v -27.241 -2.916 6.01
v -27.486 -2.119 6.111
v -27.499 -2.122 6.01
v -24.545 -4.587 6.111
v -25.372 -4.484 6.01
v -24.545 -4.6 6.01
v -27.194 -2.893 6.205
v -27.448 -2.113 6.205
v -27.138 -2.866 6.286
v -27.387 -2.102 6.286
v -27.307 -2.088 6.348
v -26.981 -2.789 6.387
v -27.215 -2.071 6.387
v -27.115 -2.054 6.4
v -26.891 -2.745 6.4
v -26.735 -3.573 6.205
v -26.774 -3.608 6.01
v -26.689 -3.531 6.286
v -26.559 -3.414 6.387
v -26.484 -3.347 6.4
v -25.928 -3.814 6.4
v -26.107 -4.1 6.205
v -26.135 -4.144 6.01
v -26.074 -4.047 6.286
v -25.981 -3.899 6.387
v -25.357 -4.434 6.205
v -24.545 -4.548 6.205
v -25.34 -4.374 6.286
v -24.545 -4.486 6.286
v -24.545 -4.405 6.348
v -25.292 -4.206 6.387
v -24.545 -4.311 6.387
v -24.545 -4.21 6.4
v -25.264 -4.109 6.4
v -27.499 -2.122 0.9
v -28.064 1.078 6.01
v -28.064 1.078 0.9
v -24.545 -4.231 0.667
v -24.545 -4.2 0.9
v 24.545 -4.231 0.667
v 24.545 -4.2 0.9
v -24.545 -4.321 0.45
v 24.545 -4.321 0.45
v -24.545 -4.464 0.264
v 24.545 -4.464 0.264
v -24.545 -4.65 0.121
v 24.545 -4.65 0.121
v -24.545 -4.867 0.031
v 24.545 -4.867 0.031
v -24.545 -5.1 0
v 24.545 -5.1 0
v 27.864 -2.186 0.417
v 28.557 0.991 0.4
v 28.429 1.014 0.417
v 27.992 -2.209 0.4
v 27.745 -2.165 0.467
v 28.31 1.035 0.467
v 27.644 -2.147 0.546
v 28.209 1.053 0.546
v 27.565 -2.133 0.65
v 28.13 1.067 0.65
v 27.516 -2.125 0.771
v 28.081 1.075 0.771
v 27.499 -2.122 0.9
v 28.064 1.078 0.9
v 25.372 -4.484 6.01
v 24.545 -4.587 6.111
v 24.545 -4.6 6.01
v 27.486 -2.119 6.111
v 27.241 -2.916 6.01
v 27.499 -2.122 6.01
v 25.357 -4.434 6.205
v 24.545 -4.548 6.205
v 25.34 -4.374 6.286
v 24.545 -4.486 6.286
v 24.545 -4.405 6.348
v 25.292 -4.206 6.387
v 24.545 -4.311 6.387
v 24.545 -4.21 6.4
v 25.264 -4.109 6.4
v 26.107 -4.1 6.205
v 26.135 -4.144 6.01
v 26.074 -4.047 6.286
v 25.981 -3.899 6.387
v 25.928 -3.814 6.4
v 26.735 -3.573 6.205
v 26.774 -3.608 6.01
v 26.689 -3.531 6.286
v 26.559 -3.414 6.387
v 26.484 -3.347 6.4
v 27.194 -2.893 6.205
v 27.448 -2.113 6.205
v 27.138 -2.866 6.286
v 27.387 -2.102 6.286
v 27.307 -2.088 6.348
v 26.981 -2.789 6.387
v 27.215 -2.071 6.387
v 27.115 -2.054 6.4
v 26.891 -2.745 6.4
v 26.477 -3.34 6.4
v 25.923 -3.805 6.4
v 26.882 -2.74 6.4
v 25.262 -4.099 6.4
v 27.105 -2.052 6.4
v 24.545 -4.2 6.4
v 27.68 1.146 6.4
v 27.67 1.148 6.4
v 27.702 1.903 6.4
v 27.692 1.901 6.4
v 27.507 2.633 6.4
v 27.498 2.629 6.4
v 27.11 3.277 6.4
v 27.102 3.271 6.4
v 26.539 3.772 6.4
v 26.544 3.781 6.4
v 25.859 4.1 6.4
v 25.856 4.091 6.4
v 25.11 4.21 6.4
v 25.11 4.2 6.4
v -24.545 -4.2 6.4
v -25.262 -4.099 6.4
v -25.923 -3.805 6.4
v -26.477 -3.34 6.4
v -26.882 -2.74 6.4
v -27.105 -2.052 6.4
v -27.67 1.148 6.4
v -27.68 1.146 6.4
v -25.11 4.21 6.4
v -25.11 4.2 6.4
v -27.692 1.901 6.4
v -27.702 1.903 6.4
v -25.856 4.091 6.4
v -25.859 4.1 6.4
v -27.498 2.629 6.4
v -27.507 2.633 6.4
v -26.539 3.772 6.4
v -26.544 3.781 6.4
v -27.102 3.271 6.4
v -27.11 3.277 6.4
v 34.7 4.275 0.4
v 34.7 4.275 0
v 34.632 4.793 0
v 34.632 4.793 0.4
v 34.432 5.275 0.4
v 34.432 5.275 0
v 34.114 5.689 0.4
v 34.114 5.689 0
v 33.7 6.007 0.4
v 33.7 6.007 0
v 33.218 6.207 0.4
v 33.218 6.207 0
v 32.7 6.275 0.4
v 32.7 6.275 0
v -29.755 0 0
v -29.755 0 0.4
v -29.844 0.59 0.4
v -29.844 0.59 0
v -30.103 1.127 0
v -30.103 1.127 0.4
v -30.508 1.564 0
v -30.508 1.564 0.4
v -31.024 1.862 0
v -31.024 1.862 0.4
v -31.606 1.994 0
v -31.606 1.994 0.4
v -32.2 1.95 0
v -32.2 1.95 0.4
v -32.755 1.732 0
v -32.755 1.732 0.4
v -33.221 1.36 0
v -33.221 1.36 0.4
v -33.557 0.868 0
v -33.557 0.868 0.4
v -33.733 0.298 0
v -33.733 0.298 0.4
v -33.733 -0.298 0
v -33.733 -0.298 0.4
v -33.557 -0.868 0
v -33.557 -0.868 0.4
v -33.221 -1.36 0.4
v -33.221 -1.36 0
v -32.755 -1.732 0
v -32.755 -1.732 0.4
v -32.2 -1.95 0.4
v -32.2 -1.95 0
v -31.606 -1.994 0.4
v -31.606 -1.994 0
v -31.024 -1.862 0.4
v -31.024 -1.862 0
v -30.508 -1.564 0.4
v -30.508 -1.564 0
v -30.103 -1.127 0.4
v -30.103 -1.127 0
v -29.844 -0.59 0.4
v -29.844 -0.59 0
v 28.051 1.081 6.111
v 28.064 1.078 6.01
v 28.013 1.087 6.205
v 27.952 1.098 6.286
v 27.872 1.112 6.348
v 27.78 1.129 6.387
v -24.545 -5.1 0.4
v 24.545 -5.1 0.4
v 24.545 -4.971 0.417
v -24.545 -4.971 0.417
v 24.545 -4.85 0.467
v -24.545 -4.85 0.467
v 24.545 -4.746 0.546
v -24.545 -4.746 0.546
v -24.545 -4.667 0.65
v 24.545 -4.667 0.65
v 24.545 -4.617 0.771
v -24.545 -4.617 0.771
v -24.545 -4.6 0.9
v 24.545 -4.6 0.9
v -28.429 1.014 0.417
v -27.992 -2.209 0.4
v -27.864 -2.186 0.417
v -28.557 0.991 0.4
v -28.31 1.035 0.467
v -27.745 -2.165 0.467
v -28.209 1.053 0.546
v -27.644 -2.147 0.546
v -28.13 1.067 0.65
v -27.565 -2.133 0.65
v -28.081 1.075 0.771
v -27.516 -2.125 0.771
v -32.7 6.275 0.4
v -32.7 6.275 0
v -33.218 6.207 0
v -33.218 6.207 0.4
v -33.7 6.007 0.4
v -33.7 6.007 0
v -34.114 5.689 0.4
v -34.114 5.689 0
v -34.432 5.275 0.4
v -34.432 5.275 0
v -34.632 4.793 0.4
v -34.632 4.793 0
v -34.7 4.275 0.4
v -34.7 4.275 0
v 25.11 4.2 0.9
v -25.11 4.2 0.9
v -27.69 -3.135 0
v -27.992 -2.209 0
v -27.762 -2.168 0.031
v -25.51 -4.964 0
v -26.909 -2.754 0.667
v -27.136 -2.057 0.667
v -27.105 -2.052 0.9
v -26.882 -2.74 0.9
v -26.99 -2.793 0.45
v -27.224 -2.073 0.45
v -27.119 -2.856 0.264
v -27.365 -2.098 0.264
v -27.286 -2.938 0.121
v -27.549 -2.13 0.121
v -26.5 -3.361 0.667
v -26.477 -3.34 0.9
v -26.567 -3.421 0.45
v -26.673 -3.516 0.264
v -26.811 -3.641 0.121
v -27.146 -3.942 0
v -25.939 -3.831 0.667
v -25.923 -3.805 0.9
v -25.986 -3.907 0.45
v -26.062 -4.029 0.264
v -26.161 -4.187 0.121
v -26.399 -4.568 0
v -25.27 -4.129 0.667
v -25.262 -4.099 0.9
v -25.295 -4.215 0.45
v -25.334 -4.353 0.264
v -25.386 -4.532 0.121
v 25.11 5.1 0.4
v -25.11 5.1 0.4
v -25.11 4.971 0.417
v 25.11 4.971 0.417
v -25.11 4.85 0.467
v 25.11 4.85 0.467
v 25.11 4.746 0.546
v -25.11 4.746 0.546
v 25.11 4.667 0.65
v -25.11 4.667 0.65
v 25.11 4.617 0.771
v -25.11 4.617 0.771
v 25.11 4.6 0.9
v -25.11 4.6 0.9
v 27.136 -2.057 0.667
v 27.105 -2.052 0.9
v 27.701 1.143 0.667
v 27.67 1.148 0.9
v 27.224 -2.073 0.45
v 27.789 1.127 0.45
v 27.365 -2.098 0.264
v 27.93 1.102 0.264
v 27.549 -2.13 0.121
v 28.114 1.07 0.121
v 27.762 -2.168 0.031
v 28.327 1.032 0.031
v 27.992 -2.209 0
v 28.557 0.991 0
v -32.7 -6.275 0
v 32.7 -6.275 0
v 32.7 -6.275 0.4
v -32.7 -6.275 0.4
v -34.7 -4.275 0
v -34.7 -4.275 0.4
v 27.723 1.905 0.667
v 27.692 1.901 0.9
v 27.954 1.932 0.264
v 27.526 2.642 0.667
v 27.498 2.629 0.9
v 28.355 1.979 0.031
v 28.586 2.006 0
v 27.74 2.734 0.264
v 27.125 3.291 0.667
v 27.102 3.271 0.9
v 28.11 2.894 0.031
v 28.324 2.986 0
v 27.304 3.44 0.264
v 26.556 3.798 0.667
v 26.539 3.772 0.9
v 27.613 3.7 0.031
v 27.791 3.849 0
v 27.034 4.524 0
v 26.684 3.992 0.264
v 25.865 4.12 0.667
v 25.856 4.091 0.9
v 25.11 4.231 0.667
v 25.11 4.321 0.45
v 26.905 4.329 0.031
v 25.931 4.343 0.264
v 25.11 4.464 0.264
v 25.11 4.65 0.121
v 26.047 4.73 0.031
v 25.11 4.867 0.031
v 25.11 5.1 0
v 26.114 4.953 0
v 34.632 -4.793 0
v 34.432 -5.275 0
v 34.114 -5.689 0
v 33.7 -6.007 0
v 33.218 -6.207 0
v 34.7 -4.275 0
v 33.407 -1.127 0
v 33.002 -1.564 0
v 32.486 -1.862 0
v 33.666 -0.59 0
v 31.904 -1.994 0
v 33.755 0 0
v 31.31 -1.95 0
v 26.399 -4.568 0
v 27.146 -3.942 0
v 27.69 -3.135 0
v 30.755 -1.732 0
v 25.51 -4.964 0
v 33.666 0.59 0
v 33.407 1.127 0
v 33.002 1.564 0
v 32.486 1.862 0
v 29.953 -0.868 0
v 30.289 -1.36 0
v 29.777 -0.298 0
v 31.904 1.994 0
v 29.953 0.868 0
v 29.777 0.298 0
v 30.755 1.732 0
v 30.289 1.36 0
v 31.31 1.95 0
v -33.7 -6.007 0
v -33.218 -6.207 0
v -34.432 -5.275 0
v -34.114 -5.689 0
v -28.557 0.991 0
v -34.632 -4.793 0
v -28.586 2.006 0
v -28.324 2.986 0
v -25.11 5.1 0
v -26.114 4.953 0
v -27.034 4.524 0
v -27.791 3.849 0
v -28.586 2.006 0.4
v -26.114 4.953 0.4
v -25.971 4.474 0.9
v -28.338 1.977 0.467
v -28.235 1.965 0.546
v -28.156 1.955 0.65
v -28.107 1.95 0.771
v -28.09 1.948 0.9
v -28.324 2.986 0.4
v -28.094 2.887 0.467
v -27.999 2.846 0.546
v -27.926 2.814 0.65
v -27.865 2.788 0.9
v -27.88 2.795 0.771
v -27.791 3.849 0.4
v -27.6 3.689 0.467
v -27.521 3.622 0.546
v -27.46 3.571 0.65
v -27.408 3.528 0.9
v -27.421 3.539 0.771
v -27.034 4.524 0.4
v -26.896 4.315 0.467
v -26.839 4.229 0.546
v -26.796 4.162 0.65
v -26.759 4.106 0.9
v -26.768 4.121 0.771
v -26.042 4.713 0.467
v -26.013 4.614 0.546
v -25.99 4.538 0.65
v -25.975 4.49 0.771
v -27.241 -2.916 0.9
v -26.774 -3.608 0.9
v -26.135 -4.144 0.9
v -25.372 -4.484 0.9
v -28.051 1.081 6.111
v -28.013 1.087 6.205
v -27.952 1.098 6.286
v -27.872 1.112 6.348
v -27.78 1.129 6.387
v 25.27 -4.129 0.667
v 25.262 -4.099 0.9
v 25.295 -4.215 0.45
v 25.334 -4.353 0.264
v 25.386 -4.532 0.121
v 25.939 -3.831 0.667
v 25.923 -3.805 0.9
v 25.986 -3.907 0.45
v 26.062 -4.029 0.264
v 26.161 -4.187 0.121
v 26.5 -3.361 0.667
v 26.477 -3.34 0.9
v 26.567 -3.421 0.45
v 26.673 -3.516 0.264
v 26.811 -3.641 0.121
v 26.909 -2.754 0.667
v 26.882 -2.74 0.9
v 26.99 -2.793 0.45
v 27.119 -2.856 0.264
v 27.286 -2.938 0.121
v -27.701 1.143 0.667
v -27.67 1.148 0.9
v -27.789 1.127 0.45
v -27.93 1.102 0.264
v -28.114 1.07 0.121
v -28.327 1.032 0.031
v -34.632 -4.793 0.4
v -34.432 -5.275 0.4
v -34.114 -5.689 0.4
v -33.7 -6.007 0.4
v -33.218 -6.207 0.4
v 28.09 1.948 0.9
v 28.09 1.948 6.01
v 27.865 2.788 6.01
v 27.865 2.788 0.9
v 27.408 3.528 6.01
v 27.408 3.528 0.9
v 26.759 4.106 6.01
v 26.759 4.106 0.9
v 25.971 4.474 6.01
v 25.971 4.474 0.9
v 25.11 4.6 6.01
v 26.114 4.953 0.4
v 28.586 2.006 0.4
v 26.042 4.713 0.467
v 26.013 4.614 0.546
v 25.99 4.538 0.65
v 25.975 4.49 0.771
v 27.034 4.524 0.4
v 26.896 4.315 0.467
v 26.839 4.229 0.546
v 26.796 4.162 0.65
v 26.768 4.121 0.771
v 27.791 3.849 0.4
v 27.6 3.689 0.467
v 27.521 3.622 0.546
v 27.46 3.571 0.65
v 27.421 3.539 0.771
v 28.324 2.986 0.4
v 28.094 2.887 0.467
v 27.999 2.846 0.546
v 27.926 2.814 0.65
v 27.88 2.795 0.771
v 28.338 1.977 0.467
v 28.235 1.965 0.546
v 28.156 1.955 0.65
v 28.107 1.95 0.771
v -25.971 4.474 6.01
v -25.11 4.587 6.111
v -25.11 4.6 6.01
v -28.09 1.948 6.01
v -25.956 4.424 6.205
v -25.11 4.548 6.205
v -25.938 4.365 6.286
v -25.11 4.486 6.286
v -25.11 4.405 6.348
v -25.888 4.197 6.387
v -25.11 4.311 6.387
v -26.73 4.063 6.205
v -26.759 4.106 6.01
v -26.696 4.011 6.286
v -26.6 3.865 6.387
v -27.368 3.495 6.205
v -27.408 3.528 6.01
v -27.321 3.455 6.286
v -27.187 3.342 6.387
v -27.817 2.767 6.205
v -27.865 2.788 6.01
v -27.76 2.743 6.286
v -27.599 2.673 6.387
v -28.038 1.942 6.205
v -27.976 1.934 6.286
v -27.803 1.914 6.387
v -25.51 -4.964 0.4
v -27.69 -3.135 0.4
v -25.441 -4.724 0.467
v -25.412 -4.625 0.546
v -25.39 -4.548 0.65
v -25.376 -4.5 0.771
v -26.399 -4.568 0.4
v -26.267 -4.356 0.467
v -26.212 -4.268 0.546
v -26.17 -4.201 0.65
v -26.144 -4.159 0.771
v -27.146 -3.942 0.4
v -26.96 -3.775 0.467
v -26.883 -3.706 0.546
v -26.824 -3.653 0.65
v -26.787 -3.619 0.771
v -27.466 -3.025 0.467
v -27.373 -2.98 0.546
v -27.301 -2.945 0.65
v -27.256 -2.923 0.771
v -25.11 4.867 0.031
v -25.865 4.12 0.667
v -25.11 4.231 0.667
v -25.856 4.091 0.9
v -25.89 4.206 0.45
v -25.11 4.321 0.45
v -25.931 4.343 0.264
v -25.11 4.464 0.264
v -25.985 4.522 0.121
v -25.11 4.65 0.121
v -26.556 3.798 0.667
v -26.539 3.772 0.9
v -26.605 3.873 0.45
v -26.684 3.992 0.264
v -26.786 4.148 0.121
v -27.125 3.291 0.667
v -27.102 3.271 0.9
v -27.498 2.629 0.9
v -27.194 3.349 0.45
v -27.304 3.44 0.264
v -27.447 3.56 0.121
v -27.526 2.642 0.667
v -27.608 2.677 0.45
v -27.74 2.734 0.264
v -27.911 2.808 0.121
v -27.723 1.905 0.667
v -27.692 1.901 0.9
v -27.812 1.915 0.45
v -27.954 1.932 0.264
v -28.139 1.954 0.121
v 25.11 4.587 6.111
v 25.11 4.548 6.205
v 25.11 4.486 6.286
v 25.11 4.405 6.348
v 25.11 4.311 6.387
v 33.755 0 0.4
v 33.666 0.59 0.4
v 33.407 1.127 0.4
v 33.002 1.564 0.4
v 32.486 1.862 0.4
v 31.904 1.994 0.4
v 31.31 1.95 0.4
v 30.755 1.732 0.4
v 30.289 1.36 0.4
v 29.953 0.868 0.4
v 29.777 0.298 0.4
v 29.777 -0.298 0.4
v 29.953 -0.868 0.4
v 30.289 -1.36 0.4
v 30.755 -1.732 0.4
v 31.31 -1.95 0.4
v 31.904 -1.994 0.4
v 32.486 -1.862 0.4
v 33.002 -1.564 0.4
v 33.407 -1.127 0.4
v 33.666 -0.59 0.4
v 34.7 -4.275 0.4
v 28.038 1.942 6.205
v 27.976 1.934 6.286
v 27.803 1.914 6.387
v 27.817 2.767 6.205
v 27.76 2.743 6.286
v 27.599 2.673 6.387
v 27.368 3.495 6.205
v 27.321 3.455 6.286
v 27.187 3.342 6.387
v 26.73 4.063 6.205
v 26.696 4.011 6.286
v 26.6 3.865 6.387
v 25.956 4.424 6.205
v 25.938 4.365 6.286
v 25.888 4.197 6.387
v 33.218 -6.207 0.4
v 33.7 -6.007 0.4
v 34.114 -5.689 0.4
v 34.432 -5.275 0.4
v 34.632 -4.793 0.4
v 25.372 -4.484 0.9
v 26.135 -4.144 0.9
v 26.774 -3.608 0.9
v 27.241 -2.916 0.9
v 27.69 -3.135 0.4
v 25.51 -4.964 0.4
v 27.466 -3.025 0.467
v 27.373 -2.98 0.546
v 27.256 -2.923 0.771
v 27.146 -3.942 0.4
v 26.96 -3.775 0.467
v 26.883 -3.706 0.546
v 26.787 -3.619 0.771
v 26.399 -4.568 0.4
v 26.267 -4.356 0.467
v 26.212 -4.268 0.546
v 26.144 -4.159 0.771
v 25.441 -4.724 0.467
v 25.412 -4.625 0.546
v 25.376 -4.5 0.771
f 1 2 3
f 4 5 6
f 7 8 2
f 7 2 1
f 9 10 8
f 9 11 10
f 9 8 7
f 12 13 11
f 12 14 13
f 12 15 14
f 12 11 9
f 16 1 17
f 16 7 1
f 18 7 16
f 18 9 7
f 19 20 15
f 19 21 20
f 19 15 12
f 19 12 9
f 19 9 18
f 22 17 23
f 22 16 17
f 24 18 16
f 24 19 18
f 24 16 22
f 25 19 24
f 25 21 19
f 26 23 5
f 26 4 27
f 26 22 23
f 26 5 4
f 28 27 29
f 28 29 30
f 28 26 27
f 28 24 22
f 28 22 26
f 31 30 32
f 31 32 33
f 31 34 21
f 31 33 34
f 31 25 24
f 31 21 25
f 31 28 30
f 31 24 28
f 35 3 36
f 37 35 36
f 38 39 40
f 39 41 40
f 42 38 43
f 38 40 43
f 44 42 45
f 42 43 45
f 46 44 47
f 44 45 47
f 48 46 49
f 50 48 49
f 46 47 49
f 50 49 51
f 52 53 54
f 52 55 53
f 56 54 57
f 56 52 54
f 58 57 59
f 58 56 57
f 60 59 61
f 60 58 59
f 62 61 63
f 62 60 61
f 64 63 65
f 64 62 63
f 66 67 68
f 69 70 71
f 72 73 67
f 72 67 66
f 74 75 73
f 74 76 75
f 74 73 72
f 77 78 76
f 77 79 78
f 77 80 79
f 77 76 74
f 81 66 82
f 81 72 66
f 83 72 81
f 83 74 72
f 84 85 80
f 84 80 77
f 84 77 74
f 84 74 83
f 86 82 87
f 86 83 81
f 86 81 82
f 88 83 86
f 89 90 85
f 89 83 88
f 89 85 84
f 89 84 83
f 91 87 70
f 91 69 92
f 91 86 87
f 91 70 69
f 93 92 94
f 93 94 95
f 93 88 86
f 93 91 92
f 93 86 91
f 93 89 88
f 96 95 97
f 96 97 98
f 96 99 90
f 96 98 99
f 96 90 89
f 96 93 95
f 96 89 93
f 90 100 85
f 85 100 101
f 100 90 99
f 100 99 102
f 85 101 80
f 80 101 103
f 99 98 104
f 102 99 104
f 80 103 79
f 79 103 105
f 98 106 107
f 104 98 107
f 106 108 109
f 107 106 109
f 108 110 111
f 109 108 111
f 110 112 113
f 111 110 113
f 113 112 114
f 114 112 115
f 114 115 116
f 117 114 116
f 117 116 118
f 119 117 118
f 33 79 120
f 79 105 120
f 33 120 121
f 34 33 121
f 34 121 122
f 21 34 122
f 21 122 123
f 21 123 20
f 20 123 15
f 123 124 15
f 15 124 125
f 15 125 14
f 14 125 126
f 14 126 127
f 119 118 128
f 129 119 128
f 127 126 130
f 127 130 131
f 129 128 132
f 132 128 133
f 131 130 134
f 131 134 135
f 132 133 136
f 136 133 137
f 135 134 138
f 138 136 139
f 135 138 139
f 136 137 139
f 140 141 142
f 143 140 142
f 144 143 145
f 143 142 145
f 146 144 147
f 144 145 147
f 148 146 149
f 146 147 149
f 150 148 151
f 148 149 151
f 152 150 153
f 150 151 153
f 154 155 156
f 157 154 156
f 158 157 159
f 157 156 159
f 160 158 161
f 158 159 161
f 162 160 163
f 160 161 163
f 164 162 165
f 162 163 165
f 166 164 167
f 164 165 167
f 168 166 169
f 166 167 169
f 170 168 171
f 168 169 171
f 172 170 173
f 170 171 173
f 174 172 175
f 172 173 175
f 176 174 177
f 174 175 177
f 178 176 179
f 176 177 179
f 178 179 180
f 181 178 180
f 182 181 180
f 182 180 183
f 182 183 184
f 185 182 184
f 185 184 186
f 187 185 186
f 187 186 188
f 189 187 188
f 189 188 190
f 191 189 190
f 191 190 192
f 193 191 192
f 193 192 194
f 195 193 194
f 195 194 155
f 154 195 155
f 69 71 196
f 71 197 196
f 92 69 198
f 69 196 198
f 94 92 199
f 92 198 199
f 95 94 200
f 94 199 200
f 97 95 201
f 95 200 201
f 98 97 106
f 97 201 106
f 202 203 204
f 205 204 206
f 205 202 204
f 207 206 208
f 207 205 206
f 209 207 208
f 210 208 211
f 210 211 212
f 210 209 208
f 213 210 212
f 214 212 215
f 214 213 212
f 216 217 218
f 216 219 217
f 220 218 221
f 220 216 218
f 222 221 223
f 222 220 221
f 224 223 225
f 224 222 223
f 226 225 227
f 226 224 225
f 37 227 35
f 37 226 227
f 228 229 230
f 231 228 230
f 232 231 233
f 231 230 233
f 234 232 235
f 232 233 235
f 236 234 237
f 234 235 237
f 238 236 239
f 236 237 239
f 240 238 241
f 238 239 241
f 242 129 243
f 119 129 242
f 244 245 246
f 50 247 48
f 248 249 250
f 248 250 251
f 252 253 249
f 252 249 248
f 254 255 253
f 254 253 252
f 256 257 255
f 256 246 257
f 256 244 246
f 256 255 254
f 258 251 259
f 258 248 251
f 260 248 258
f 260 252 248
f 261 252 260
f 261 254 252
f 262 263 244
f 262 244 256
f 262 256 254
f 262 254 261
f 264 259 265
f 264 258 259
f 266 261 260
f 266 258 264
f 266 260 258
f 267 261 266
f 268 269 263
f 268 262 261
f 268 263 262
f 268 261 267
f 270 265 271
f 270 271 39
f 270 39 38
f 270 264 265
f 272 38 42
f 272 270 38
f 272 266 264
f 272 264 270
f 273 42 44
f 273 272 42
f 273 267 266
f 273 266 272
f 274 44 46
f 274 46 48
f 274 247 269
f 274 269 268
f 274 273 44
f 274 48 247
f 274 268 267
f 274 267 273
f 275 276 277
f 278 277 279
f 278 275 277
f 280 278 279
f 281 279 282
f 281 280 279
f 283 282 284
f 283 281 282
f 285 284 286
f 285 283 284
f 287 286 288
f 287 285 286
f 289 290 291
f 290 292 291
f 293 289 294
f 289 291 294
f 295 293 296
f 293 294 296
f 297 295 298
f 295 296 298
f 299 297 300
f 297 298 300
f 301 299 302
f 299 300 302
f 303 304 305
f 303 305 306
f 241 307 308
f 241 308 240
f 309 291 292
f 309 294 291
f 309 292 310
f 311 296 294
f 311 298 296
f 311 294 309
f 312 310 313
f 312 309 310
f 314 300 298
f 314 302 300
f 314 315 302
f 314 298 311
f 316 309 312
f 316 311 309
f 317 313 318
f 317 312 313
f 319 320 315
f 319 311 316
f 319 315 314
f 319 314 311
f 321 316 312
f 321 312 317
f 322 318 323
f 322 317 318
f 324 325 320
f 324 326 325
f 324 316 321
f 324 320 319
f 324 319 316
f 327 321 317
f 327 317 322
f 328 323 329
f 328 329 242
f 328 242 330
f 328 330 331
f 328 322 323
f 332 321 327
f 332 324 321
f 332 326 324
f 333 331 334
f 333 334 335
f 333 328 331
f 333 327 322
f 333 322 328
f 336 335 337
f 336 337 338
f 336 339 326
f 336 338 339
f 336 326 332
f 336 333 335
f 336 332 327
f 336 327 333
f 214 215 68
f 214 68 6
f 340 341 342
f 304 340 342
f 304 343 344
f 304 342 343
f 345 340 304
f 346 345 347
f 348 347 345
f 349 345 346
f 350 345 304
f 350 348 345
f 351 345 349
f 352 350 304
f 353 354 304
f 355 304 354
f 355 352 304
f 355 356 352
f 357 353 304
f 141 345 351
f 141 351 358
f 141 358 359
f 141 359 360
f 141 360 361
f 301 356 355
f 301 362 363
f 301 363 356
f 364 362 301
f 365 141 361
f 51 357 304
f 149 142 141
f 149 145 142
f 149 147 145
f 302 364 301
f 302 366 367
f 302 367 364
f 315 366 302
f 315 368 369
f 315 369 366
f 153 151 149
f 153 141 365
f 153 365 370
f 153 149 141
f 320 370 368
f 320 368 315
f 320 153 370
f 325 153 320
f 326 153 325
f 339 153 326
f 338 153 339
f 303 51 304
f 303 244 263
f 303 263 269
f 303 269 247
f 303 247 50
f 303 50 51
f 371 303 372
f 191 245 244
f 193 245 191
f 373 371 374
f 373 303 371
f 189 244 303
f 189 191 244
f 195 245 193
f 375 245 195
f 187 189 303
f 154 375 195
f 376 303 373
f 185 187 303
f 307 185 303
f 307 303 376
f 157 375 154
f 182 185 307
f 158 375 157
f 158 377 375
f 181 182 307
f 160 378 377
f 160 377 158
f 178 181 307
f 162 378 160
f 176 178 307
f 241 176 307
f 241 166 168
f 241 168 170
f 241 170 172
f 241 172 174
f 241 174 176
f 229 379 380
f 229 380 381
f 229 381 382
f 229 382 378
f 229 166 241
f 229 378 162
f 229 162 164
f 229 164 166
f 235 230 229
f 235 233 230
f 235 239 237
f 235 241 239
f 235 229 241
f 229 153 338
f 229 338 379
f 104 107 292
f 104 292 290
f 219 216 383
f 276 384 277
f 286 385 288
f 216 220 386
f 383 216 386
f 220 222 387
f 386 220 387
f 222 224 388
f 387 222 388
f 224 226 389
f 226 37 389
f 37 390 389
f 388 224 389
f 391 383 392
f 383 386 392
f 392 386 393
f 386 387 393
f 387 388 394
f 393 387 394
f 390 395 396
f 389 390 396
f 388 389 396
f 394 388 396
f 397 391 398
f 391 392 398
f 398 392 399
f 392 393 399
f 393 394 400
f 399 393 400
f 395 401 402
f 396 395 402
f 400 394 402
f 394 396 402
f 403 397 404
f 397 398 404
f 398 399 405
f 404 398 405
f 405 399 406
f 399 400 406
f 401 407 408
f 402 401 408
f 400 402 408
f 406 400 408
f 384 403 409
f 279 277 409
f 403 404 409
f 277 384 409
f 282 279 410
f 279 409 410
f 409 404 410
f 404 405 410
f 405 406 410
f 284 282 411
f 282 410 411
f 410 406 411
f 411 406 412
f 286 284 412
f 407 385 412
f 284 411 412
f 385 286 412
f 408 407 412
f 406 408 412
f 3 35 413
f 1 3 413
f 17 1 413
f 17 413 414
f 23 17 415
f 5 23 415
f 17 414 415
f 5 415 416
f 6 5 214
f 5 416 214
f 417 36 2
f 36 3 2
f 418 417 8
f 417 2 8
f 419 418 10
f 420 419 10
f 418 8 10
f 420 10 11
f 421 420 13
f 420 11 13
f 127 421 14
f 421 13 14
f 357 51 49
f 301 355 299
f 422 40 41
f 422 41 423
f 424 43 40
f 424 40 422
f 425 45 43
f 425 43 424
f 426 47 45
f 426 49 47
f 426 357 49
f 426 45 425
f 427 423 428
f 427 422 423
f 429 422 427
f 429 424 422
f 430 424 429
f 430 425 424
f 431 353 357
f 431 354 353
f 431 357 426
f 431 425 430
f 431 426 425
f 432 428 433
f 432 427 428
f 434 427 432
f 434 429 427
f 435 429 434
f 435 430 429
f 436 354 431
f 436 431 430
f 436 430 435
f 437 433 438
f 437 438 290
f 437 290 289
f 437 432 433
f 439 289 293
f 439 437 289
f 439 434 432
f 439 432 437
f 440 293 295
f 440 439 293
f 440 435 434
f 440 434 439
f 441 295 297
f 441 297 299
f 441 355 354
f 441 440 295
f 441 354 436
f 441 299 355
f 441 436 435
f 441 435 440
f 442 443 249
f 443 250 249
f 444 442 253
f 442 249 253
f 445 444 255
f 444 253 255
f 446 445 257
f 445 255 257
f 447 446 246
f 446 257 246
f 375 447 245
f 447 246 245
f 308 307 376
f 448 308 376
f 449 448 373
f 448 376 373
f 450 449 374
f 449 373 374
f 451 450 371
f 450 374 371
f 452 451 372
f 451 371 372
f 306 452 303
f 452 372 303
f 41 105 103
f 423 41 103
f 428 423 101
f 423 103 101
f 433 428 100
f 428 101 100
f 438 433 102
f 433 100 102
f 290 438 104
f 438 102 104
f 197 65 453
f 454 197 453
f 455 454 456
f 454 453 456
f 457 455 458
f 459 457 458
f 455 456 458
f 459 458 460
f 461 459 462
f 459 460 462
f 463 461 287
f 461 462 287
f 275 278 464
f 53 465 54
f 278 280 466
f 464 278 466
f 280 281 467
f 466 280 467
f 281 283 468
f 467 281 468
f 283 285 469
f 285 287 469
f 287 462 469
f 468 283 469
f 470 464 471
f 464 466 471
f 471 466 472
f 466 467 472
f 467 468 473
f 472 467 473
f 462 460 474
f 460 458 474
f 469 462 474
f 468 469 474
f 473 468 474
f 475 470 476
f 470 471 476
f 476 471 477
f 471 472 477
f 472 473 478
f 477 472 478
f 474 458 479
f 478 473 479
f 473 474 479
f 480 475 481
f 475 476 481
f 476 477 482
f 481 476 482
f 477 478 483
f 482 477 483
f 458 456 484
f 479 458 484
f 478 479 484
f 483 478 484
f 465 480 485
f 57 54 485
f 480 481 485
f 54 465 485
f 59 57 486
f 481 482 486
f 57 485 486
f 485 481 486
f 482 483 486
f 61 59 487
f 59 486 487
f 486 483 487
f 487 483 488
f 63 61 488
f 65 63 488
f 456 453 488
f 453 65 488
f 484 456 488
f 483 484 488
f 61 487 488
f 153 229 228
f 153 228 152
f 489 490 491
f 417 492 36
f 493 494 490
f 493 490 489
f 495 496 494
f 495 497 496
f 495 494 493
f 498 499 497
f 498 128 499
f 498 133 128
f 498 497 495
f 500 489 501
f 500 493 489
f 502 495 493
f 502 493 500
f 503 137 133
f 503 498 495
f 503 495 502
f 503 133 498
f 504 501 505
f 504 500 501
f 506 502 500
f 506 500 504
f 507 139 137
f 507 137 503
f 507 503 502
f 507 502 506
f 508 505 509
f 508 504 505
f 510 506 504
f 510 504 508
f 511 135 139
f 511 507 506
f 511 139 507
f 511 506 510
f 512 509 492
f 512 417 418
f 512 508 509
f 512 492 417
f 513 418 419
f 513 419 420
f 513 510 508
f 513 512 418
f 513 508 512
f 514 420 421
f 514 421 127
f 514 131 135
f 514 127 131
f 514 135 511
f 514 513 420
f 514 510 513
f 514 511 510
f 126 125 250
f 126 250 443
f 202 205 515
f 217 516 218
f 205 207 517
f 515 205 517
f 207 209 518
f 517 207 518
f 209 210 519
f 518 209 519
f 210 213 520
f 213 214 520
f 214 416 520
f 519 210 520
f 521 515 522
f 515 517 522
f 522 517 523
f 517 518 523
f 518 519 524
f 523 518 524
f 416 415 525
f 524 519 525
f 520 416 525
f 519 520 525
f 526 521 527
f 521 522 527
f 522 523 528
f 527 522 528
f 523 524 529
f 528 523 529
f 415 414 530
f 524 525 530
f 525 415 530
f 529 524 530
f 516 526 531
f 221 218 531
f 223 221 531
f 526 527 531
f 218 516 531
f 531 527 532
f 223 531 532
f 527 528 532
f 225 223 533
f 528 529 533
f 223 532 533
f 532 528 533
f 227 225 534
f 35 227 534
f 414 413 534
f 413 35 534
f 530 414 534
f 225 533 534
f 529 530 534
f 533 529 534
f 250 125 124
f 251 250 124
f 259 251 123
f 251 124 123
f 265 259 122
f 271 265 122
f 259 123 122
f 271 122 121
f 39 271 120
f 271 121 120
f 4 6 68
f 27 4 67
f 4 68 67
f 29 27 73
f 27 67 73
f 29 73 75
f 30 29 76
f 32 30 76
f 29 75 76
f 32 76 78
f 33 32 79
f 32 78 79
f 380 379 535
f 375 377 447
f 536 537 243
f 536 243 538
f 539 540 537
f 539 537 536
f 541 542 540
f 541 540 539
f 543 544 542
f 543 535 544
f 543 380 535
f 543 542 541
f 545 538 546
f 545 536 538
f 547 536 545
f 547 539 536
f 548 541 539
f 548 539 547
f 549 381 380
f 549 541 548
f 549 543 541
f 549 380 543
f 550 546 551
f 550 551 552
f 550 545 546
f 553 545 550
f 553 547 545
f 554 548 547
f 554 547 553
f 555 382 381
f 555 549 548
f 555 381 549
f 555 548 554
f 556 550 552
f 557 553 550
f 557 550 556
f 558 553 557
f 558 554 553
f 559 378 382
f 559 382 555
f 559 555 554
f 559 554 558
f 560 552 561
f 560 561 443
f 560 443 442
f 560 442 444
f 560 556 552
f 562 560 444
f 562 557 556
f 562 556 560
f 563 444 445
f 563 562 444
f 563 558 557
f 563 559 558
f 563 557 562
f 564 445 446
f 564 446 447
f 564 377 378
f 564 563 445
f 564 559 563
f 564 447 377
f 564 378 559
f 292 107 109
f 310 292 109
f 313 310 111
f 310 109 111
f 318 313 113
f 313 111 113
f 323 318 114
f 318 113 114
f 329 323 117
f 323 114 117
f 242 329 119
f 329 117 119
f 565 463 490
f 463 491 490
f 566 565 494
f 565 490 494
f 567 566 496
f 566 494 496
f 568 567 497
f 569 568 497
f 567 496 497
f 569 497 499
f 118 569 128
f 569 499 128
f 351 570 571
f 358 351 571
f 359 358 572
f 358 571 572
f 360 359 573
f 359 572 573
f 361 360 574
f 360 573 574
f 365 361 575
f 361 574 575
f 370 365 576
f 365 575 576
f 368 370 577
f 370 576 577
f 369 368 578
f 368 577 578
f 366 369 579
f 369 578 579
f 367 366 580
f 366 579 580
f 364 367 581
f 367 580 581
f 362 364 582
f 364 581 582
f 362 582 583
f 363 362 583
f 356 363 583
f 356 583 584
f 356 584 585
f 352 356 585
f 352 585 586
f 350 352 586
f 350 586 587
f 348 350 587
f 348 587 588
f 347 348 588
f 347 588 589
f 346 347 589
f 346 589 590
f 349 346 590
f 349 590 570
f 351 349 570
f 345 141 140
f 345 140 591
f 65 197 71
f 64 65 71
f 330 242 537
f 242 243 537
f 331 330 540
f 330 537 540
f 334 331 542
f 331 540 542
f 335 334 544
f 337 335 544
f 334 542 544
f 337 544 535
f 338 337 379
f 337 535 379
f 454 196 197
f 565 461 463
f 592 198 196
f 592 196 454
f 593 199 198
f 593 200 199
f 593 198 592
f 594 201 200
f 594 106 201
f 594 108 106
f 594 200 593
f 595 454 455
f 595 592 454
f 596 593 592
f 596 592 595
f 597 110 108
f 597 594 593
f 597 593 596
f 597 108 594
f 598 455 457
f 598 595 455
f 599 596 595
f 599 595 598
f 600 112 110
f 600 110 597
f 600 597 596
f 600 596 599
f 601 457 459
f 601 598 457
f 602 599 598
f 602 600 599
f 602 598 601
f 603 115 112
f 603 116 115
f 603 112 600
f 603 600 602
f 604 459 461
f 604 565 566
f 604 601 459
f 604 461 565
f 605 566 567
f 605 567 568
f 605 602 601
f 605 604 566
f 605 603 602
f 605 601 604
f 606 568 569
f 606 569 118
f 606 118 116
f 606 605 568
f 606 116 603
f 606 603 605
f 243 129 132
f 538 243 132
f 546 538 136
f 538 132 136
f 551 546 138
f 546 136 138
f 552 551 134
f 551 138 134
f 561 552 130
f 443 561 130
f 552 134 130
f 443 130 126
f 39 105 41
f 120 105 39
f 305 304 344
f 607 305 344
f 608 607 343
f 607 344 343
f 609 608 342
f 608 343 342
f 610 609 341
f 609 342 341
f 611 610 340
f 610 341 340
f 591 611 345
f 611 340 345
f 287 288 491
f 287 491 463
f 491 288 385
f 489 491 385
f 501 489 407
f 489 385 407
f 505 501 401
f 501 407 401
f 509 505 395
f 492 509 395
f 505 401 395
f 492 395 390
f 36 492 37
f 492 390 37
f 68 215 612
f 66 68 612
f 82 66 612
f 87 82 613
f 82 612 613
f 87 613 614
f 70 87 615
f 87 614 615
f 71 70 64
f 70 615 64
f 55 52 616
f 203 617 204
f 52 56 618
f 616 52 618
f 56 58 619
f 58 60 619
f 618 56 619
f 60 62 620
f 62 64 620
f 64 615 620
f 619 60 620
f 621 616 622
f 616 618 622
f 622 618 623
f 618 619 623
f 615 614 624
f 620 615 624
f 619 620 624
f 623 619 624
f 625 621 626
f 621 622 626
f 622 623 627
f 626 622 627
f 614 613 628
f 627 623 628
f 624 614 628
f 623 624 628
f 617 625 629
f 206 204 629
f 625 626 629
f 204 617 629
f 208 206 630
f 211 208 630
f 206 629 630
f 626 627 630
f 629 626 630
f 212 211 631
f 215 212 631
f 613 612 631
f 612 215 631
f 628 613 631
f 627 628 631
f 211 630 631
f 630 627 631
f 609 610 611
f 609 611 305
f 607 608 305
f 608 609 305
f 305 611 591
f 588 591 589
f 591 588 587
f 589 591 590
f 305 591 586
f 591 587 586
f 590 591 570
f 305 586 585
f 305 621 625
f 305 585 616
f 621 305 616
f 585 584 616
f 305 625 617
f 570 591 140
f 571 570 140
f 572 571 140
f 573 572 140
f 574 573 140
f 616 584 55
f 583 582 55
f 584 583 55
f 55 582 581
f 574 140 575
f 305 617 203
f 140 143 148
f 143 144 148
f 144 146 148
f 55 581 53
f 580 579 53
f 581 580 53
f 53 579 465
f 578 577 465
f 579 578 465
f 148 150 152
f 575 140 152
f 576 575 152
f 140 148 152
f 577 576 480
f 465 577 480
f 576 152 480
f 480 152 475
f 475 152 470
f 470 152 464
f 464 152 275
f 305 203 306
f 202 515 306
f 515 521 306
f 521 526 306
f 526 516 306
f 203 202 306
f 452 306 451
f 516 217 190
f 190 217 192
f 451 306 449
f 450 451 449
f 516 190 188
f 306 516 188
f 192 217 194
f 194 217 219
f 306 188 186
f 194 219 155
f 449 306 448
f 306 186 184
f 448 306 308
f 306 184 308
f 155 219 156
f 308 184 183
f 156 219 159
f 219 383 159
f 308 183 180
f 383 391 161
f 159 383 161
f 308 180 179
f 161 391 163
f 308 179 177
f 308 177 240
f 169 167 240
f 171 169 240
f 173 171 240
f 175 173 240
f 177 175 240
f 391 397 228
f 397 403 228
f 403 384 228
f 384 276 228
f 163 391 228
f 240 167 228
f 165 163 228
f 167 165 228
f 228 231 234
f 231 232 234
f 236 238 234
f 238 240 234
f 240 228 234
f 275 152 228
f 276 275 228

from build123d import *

# Parameters (mm, degrees)
PAD_DEPTH       = 0.4
SKETCH001_R     = 2
POCKET_DEPTH    = 5
PAD001_DEPTH    = 6
POCKET001_DEPTH = 6.401
FILLET_R        = 0.5
FILLET001_R     = 0.39
FILLET002_R     = 0.9


with BuildPart() as part:
    # Sketch → Pad (new body)
    with BuildSketch(Plane.XY):
        with BuildLine():
            Line((-32.7, 6.275), (32.7, 6.275))
            ThreePointArc((34.7, 4.275), (34.114214, 5.689214), (32.7, 6.275))
            Line((34.7, 4.275), (34.7, -4.275))
            ThreePointArc((32.7, -6.275), (34.114214, -5.689214), (34.7, -4.275))
            Line((32.7, -6.275), (-32.7, -6.275))
            ThreePointArc((-34.7, -4.275), (-34.114214, -5.689214), (-32.7, -6.275))
            Line((-34.7, -4.275), (-34.7, 4.275))
            ThreePointArc((-32.7, 6.275), (-34.114214, 5.689214), (-34.7, 4.275))
        make_face()
    extrude(amount=PAD_DEPTH)

    # Sketch001 (on Face10 of Pad) → Pocket (cut)
    with BuildSketch(Plane.XY.offset(0.4)):
        with Locations((-31.755, 0)):
            Circle(SKETCH001_R)
        with Locations((31.755, 0)):
            Circle(SKETCH001_R)
    extrude(amount=-POCKET_DEPTH, mode=Mode.SUBTRACT)

    # Sketch002 (on Face5 of Pocket) → Pad001 (join)
    with BuildSketch(Plane.XY.offset(0.4)):
        with BuildLine():
            Line((-25.11, 4.6), (25.11, 4.6))
            ThreePointArc((28.064304, 1.078381), (27.408354, 3.5281), (25.11, 4.6))
            Line((28.064304, 1.078381), (27.499304, -2.121619))
            ThreePointArc((24.545, -4.6), (26.4731, -3.898354), (27.499304, -2.121619))
            Line((24.545, -4.6), (-24.545, -4.6))
            ThreePointArc((-27.499304, -2.121619), (-26.4731, -3.898354), (-24.545, -4.6))
            Line((-27.499304, -2.121619), (-28.064304, 1.078381))
            ThreePointArc((-25.11, 4.6), (-27.408354, 3.5281), (-28.064304, 1.078381))
        make_face()
    extrude(amount=PAD001_DEPTH)

    # Sketch003 (on Face21 of Pad001) → Pocket001 (cut, through all)
    with BuildSketch(Plane.XY.offset(6.4)):
        with BuildLine():
            Line((-25.11, 4.2), (25.11, 4.2))
            ThreePointArc((27.670397, 1.14793), (27.101906, 3.27102), (25.11, 4.2))
            Line((27.670397, 1.14793), (27.105397, -2.05207))
            ThreePointArc((24.545, -4.2), (26.21602, -3.591906), (27.105397, -2.05207))
            Line((24.545, -4.2), (-24.545, -4.2))
            ThreePointArc((-27.105397, -2.05207), (-26.21602, -3.591906), (-24.545, -4.2))
            Line((-27.105397, -2.05207), (-27.670397, 1.14793))
            ThreePointArc((-25.11, 4.2), (-27.101906, 3.27102), (-27.670397, 1.14793))
        make_face()
    extrude(amount=-POCKET001_DEPTH, mode=Mode.SUBTRACT)

    # Fillet
    fillet_edges = [part.edges().sort_by_distance(p)[0] for p in [
        (0, -4.6, 0.4),
    ]]
    fillet(fillet_edges, radius=FILLET_R)

    # Fillet001
    fillet001_edges = [part.edges().sort_by_distance(p)[0] for p in [
        (-26.4731, -3.898354, 6.4),
    ]]
    fillet(fillet001_edges, radius=FILLET001_R)

    # Fillet002
    fillet002_edges = [part.edges().sort_by_distance(p)[0] for p in [
        (0, 4.2, 0),
    ]]
    fillet(fillet002_edges, radius=FILLET002_R)


solid = part.part
